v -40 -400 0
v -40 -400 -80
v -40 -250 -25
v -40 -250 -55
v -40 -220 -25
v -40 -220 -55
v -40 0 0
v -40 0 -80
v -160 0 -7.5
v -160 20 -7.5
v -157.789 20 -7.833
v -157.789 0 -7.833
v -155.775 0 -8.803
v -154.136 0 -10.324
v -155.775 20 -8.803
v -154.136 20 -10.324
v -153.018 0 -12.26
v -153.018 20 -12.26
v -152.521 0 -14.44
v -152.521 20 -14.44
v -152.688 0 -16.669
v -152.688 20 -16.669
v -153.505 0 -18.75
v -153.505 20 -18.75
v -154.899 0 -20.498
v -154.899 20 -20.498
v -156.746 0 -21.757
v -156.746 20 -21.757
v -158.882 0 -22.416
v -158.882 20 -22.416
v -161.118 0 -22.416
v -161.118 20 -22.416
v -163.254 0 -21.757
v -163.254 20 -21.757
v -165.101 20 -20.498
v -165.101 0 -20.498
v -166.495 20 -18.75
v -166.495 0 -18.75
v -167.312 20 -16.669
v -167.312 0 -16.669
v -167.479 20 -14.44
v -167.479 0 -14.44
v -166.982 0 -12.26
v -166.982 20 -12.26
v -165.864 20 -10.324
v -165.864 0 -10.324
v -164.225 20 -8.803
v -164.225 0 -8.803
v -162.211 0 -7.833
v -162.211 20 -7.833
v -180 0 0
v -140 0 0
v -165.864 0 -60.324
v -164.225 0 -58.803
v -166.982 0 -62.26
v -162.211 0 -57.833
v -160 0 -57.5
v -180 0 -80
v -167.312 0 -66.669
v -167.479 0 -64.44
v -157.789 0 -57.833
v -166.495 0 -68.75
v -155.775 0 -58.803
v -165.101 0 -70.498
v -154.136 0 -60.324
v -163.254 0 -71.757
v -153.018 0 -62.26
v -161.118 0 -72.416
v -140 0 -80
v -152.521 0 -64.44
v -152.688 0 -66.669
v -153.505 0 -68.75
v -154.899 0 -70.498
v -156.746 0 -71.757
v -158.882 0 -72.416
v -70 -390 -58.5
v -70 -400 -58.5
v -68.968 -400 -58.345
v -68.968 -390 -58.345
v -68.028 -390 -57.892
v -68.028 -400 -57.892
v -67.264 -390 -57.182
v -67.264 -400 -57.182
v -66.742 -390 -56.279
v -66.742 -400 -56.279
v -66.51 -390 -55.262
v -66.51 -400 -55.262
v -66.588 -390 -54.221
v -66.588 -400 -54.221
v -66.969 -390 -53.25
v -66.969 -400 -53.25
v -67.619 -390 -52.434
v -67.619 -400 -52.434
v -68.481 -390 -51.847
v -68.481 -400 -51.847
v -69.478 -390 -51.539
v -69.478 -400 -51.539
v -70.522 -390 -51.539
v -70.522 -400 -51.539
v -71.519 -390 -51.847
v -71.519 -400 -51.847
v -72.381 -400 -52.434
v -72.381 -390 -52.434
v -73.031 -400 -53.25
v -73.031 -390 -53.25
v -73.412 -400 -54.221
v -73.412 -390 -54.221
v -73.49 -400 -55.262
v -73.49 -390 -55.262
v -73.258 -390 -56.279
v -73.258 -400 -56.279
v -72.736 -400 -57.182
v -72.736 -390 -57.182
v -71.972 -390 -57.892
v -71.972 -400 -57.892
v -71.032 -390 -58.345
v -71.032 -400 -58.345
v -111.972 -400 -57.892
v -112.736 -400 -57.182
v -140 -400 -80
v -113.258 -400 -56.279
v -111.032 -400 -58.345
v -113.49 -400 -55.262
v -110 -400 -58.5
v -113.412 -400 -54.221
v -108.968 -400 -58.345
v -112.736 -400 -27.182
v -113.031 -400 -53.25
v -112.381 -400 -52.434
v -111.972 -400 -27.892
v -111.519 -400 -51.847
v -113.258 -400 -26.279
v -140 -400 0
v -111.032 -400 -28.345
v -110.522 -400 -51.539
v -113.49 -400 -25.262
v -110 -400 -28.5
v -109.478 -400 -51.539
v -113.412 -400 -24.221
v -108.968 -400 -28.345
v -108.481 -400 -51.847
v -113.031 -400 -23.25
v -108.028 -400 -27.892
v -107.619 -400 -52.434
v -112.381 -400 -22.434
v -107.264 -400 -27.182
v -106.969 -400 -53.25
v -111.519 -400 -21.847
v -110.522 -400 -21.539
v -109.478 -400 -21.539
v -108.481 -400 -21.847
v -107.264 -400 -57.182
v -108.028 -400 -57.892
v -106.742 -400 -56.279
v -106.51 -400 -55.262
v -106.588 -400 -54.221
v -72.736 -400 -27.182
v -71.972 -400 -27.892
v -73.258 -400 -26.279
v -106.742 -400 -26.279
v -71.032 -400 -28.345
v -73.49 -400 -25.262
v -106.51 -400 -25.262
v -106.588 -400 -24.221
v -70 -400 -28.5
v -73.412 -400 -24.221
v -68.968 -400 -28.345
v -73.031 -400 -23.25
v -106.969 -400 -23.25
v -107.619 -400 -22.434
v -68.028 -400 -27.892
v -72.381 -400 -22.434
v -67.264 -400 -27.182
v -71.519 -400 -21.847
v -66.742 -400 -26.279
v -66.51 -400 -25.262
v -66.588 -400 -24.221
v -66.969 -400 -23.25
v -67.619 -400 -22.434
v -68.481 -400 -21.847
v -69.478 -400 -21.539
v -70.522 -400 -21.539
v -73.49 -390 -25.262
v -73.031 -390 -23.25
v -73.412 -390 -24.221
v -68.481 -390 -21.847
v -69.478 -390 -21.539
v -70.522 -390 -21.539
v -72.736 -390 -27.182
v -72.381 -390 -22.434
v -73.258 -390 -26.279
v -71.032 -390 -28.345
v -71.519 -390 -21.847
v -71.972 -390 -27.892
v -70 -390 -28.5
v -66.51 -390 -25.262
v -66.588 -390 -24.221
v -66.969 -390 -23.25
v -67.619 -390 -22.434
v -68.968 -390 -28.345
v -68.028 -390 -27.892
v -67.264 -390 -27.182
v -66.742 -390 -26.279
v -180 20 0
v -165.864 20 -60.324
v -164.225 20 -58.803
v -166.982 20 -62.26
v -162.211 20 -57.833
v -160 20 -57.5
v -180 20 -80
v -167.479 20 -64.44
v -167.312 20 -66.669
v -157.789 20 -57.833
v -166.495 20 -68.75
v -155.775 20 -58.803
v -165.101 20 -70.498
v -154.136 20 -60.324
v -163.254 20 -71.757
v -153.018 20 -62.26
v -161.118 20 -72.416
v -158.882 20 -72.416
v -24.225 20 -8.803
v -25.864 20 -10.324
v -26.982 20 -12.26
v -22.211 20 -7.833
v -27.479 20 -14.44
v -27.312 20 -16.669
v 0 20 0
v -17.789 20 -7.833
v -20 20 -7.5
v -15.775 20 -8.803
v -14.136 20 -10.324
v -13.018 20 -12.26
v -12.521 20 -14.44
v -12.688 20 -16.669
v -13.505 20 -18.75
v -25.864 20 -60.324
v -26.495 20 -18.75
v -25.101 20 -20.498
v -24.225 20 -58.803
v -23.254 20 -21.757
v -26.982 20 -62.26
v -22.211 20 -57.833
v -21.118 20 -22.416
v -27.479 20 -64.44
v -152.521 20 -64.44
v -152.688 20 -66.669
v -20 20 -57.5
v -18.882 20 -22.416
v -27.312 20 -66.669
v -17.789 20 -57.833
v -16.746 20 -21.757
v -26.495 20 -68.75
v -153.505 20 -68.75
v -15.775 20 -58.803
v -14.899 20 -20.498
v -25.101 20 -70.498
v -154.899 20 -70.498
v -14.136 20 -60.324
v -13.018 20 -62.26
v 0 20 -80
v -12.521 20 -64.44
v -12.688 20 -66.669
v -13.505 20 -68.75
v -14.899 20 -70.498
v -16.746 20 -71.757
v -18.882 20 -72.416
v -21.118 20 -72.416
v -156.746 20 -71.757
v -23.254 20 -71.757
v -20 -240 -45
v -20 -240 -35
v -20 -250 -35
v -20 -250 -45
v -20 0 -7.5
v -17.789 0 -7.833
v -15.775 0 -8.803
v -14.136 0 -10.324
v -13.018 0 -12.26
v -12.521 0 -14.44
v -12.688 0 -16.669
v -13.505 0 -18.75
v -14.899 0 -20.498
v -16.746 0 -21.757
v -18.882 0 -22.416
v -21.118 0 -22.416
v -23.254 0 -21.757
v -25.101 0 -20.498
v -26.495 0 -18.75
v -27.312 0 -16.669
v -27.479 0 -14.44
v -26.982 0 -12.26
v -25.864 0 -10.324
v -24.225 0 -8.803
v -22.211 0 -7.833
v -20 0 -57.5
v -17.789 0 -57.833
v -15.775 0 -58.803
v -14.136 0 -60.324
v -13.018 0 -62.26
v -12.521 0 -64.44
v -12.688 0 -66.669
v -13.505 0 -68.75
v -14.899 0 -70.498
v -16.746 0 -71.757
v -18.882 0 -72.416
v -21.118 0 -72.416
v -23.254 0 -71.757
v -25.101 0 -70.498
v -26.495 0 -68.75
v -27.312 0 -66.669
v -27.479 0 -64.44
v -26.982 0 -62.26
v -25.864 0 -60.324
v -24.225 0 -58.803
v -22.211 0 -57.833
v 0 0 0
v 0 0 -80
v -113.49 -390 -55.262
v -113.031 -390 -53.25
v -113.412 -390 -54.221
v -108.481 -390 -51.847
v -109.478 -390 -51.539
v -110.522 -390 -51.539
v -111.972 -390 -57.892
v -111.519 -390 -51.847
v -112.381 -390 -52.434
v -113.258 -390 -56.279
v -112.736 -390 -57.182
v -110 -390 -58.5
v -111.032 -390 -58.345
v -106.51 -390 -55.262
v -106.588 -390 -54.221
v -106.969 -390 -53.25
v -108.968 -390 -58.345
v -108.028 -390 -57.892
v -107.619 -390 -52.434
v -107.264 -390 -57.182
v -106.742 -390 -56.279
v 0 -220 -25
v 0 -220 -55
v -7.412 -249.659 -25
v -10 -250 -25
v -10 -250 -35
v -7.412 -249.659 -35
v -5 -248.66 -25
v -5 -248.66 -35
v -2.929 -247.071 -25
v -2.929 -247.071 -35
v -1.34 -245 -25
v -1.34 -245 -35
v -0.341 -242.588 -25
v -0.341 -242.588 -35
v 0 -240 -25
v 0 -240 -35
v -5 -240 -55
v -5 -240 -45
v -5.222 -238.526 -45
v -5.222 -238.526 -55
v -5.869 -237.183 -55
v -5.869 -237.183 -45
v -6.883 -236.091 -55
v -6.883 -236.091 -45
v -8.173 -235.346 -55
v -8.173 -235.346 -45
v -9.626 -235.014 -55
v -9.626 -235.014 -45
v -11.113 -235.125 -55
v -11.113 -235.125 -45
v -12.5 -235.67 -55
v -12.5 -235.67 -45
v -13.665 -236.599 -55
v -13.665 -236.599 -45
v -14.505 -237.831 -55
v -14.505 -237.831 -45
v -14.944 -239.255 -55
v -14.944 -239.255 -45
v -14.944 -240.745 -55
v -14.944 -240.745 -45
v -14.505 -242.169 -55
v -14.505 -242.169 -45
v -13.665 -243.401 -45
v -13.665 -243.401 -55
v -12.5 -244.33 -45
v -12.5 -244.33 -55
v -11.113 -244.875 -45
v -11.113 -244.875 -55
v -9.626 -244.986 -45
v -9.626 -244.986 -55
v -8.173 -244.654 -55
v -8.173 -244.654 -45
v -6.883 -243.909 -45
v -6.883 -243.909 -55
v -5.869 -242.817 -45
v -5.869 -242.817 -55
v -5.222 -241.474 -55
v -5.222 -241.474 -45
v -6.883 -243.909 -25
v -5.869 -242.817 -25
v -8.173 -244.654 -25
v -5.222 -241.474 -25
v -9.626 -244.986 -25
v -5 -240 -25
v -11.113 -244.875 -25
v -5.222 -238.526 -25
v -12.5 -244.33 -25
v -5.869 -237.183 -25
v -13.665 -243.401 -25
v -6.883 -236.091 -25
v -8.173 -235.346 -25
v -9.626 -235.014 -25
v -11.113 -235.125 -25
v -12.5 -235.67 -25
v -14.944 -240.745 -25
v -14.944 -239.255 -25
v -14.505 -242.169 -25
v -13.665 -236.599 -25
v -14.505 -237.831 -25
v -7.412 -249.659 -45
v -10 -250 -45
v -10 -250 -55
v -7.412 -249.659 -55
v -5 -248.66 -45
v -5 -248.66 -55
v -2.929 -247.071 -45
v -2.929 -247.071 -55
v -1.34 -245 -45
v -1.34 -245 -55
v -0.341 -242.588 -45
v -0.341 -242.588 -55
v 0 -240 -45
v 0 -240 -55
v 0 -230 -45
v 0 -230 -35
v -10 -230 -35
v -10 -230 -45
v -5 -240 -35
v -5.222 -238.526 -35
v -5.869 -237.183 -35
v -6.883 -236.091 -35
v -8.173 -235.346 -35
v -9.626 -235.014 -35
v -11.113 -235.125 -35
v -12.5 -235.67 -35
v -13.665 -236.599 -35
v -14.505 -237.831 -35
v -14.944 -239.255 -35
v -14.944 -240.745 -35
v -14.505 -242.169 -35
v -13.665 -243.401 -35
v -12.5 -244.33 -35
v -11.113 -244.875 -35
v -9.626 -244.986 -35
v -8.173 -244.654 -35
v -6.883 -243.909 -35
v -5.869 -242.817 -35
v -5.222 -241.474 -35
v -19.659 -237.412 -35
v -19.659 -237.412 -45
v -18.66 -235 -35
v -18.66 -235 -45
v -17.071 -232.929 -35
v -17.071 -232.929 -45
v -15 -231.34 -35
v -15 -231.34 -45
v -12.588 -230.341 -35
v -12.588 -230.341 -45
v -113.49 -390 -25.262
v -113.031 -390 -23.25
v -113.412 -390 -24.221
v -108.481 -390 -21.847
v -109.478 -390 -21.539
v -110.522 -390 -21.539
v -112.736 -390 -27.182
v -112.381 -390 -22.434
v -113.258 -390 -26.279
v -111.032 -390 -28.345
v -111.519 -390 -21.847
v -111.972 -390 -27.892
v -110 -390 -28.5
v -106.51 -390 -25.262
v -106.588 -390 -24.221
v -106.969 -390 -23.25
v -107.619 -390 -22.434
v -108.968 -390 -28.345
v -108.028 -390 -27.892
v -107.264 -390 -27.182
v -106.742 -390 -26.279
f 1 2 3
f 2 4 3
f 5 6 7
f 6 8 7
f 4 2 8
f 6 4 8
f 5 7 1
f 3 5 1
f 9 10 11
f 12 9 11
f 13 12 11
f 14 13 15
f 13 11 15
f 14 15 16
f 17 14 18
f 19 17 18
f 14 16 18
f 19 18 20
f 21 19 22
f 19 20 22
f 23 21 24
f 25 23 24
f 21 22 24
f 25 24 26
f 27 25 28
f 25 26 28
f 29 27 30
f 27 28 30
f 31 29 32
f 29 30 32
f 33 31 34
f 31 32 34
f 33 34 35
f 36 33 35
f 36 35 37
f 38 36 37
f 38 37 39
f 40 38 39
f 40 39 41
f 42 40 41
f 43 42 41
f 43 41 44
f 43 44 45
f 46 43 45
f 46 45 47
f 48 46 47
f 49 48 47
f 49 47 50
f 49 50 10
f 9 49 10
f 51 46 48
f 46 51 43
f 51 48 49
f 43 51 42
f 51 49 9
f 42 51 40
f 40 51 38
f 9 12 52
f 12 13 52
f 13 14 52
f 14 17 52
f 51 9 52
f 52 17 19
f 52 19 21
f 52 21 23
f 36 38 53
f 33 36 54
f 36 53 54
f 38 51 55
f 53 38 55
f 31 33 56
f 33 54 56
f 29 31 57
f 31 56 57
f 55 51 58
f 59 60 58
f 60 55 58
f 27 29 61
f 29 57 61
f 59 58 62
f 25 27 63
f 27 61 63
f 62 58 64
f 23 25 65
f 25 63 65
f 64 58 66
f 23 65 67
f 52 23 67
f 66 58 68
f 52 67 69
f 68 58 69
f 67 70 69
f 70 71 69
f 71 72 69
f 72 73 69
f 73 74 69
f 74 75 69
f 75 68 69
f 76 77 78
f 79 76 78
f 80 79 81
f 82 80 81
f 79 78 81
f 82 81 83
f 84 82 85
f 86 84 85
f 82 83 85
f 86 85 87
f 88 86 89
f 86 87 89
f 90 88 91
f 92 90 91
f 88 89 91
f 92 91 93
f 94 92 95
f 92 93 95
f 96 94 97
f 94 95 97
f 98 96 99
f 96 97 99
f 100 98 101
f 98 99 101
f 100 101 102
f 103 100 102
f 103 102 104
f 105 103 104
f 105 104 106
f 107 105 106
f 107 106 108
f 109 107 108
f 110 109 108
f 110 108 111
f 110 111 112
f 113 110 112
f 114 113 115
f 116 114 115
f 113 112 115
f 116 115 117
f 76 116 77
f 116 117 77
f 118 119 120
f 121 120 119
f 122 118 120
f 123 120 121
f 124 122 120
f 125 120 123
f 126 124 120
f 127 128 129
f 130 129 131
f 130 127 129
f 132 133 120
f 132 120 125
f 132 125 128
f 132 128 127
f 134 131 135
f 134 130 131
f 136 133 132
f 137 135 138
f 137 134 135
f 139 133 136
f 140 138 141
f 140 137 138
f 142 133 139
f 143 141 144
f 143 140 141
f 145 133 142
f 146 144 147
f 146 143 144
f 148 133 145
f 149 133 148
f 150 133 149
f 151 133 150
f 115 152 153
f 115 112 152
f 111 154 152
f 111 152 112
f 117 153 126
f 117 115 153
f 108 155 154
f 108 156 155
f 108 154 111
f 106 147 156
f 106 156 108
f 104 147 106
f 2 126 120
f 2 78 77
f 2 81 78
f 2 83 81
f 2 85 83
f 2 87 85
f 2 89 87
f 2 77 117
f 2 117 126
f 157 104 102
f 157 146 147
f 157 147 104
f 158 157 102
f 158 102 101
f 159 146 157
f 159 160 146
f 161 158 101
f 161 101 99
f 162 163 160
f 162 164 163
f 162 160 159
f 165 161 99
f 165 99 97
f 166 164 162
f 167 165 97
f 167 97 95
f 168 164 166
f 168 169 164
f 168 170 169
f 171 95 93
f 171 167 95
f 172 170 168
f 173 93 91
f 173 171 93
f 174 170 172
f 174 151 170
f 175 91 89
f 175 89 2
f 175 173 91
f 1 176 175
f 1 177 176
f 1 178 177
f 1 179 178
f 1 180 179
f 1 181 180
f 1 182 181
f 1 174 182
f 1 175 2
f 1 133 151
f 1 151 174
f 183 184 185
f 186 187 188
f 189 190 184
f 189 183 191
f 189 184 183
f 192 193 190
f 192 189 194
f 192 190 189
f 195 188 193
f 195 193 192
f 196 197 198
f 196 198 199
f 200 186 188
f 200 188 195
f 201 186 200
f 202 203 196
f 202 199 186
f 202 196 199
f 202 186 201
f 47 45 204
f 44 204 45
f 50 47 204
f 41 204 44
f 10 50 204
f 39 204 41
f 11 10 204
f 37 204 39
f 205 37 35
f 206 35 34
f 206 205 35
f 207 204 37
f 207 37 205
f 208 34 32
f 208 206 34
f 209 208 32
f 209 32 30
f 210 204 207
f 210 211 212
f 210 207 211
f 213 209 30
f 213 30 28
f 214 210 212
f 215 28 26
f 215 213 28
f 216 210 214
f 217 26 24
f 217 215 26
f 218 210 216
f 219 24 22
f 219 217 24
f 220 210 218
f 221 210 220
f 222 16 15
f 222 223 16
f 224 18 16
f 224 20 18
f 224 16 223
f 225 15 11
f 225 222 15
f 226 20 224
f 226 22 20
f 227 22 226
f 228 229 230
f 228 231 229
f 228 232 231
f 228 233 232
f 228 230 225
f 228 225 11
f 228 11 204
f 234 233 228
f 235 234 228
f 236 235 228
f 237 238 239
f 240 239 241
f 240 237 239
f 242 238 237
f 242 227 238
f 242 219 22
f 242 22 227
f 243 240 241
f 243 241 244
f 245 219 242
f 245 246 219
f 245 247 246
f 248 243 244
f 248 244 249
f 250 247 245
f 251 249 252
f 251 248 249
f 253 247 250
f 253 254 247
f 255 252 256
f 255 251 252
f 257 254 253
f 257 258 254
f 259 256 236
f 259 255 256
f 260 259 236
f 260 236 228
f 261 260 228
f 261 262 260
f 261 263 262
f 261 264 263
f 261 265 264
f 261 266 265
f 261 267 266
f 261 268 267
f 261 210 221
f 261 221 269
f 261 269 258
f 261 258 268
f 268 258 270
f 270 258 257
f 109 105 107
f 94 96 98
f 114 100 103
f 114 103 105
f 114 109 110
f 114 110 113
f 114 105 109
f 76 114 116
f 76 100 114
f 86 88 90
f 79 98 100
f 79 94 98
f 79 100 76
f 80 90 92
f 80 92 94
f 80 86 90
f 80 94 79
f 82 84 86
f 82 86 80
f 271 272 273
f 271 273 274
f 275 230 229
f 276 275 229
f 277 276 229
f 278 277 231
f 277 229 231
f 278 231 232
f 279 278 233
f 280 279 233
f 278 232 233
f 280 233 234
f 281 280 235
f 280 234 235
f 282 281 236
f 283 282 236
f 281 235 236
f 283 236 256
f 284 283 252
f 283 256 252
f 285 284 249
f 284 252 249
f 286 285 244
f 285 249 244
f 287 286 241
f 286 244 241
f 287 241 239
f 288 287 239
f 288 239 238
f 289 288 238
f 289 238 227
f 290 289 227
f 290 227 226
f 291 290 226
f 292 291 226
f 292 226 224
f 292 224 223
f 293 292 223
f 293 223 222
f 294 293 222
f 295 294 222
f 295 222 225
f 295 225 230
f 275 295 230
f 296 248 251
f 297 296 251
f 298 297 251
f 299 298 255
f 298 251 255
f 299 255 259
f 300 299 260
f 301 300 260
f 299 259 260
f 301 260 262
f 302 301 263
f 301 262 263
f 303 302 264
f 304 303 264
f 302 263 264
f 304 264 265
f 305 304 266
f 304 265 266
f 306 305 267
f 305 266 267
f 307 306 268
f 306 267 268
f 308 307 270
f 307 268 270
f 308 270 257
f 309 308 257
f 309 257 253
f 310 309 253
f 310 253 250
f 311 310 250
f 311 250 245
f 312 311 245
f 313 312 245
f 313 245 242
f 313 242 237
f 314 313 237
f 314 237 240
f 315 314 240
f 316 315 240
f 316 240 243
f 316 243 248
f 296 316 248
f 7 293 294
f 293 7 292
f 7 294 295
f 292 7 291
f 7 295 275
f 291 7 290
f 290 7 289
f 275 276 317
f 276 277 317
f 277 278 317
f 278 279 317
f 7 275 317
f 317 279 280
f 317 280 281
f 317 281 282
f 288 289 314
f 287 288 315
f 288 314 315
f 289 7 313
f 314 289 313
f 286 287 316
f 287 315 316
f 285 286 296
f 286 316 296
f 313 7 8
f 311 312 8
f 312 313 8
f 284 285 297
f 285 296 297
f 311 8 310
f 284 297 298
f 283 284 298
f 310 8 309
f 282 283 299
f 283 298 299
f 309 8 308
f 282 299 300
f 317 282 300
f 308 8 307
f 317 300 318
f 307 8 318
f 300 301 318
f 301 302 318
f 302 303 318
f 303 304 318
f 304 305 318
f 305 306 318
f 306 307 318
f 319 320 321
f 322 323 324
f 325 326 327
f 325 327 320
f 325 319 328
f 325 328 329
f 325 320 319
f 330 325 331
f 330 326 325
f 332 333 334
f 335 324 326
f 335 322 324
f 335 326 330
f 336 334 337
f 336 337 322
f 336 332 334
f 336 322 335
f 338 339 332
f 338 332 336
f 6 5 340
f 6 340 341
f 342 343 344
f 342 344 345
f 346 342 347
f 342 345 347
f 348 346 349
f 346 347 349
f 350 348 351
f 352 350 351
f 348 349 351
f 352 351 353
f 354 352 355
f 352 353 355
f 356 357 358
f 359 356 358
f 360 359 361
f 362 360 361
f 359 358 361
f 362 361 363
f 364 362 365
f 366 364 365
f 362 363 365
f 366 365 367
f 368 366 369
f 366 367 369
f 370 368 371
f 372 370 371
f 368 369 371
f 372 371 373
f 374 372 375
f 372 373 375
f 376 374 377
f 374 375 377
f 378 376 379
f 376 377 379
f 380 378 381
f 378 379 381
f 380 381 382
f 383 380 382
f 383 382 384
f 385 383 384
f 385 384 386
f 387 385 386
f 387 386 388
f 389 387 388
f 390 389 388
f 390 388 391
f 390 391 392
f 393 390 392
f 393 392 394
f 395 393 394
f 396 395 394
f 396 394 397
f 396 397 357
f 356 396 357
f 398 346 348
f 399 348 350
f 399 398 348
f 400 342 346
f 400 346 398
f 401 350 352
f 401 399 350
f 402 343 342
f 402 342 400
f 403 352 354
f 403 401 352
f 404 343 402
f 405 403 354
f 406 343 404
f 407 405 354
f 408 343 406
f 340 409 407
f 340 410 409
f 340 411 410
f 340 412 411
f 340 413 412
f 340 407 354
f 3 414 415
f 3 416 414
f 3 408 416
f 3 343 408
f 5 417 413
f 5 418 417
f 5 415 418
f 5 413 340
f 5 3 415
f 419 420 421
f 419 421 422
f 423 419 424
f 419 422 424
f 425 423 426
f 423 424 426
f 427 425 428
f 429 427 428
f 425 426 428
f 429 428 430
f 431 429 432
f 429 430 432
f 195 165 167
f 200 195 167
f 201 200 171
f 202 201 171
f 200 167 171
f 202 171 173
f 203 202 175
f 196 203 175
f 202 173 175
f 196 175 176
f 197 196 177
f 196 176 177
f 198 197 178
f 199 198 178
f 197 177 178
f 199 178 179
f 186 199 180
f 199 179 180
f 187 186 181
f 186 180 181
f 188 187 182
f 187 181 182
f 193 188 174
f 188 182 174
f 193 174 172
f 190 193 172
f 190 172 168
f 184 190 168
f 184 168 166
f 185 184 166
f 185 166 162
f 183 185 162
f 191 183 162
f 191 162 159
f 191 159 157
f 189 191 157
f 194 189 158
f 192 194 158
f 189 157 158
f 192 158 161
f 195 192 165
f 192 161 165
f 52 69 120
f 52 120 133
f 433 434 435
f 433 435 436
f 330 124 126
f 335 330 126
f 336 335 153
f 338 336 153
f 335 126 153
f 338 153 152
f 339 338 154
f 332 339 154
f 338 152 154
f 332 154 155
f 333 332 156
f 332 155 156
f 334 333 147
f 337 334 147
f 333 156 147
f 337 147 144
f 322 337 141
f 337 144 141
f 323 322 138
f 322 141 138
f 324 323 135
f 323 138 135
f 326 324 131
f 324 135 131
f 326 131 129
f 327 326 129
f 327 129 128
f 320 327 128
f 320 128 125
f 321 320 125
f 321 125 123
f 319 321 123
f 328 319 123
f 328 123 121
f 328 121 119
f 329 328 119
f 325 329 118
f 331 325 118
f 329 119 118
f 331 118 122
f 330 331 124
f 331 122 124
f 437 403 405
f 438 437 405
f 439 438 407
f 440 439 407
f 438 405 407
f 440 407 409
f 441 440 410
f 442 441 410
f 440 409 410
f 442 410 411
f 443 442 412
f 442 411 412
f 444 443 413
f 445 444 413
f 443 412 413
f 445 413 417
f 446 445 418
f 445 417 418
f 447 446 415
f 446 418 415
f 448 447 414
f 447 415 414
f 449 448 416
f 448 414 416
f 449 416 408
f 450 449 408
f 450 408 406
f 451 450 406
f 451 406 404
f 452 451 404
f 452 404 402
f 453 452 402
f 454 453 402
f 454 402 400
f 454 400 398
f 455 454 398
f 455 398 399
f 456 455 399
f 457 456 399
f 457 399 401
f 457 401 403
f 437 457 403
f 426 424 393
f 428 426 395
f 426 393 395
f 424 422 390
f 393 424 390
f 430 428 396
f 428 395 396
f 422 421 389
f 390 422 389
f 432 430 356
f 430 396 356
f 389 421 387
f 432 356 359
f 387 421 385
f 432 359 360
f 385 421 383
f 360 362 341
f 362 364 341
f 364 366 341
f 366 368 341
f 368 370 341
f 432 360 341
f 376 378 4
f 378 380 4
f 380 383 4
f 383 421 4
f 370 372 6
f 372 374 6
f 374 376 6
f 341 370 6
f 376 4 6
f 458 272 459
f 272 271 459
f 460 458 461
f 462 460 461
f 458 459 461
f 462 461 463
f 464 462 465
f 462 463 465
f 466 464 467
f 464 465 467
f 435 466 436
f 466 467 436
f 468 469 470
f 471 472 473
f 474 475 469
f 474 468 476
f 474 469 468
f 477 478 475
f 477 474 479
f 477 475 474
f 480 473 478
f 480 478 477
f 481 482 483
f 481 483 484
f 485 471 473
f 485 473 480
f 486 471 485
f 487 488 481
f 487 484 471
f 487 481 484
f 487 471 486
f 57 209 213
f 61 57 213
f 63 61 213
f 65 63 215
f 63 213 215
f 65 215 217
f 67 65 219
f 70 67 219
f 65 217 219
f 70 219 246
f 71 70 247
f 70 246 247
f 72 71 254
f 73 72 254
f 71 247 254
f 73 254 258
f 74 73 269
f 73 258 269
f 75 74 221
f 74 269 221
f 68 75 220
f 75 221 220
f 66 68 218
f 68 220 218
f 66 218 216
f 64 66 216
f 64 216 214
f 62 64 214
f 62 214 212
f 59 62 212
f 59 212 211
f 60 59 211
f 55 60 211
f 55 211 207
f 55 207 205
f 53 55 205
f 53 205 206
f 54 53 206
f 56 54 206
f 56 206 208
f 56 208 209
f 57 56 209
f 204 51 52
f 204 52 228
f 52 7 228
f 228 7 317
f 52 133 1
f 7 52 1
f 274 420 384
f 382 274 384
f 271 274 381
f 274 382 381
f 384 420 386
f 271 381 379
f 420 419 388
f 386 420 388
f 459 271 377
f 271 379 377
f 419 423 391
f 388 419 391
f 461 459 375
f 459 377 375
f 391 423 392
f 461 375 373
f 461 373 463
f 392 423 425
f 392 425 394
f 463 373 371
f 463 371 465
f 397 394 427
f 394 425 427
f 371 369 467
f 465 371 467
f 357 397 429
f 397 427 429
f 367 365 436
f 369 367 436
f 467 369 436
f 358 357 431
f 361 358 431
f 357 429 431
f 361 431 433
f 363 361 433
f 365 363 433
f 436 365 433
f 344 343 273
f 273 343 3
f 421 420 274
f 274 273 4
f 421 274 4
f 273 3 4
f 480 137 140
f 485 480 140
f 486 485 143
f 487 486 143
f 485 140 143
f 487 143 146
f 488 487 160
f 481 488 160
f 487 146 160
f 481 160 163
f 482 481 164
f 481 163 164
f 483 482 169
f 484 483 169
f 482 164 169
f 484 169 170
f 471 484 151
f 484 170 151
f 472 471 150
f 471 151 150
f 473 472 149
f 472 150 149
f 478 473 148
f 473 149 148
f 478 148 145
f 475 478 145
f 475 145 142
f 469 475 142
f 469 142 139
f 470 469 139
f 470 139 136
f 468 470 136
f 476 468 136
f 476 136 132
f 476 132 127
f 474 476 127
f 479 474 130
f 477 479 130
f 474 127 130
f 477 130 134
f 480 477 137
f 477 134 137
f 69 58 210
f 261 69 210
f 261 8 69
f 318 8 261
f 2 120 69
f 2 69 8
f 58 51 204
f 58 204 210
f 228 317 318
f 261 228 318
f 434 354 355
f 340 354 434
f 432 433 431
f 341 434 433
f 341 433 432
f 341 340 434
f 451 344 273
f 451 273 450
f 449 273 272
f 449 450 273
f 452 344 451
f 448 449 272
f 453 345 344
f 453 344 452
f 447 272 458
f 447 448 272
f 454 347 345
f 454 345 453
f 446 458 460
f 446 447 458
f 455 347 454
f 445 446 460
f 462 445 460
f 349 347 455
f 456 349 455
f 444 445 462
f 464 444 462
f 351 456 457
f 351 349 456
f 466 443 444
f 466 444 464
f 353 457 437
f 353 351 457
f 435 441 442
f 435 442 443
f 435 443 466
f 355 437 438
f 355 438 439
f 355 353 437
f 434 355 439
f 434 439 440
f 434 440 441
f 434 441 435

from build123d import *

# Parameters (mm, degrees)
SKETCH1_W           = 180
SKETCH1_H           = 80
BOSS_EXTRUDE1_DEPTH = 20
SKETCH2_R           = 7.5
CUT_EXTRUDE1_DEPTH  = 198.989898732
SKETCH3_W           = 100
SKETCH3_H           = 80
BOSS_EXTRUDE2_DEPTH = 400
SKETCH4_R           = 3.5
CUT_EXTRUDE2_DEPTH  = 10
SKETCH12_W          = 30
SKETCH12_H          = 30
BOSS_EXTRUDE6_DEPTH = 40
SKETCH13_R          = 5
CUT_EXTRUDE7_DEPTH  = 30
SKETCH14_W          = 10
SKETCH14_H          = 20
CUT_EXTRUDE8_DEPTH  = 20
FILLET4_R           = 10


with BuildPart() as part:
    # Sketch1 → Boss-Extrude1 (new body)
    with BuildSketch(Plane(origin=(0, 0, 0), x_dir=(1, 0, 0), z_dir=(0, 1, 0))):
        with Locations((-90, 40)):
            Rectangle(SKETCH1_W, SKETCH1_H)
    extrude(amount=BOSS_EXTRUDE1_DEPTH)

    # Sketch2 → Cut-Extrude1 (cut, through all)
    with BuildSketch(Plane(origin=(0, 20, 0), x_dir=(1, 0, 0), z_dir=(0, 1, 0))):
        with Locations(Location((-160, 65, 0), (0, 0, 270))):
            Circle(SKETCH2_R)
        with Locations(Location((-160, 15, 0), (0, 0, 270))):
            Circle(SKETCH2_R)
        with Locations(Location((-20, 65, 0), (0, 0, 270))):
            Circle(SKETCH2_R)
        with Locations(Location((-20, 15, 0), (0, 0, 270))):
            Circle(SKETCH2_R)
    extrude(amount=-CUT_EXTRUDE1_DEPTH, mode=Mode.SUBTRACT)

    # Sketch3 → Boss-Extrude2 (add)
    with BuildSketch(Plane.XZ):
        with Locations((-90, -40)):
            Rectangle(SKETCH3_W, SKETCH3_H)
    extrude(amount=BOSS_EXTRUDE2_DEPTH)

    # Sketch4 → Cut-Extrude2 (cut)
    with BuildSketch(Plane.XZ.offset(400)):
        with Locations(Location((-110, -25, 0), (0, 0, 270))):
            Circle(SKETCH4_R)
        with Locations(Location((-70, -25, 0), (0, 0, 270))):
            Circle(SKETCH4_R)
        with Locations(Location((-110, -55, 0), (0, 0, 270))):
            Circle(SKETCH4_R)
        with Locations(Location((-70, -55, 0), (0, 0, 270))):
            Circle(SKETCH4_R)
    extrude(amount=-CUT_EXTRUDE2_DEPTH, mode=Mode.SUBTRACT)

    # Sketch12 → Boss-Extrude6 (add)
    with BuildSketch(Plane(origin=(-40, 0, 0), x_dir=(0, 0, -1), z_dir=(1, 0, 0))):
        with Locations((40, -235)):
            Rectangle(SKETCH12_W, SKETCH12_H)
    extrude(amount=BOSS_EXTRUDE6_DEPTH)

    # Sketch13 → Cut-Extrude7 (cut)
    with BuildSketch(Plane.XY.offset(-25)):
        with Locations((-10, -240)):
            Circle(SKETCH13_R)
    extrude(amount=-CUT_EXTRUDE7_DEPTH, mode=Mode.SUBTRACT)

    # Sketch14 → Cut-Extrude8 (cut)
    with BuildSketch(Plane(origin=(0, 0, 0), x_dir=(0, 0, -1), z_dir=(1, 0, 0))):
        with Locations((40, -240)):
            Rectangle(SKETCH14_W, SKETCH14_H)
    extrude(amount=-CUT_EXTRUDE8_DEPTH, mode=Mode.SUBTRACT)

    # Fillet4
    fillet4_edges = [part.edges().sort_by_distance(p)[0] for p in [
        (0, -250, -30),
        (0, -250, -50),
        (-20, -230, -40),
    ]]
    fillet(fillet4_edges, radius=FILLET4_R)


solid = part.part
